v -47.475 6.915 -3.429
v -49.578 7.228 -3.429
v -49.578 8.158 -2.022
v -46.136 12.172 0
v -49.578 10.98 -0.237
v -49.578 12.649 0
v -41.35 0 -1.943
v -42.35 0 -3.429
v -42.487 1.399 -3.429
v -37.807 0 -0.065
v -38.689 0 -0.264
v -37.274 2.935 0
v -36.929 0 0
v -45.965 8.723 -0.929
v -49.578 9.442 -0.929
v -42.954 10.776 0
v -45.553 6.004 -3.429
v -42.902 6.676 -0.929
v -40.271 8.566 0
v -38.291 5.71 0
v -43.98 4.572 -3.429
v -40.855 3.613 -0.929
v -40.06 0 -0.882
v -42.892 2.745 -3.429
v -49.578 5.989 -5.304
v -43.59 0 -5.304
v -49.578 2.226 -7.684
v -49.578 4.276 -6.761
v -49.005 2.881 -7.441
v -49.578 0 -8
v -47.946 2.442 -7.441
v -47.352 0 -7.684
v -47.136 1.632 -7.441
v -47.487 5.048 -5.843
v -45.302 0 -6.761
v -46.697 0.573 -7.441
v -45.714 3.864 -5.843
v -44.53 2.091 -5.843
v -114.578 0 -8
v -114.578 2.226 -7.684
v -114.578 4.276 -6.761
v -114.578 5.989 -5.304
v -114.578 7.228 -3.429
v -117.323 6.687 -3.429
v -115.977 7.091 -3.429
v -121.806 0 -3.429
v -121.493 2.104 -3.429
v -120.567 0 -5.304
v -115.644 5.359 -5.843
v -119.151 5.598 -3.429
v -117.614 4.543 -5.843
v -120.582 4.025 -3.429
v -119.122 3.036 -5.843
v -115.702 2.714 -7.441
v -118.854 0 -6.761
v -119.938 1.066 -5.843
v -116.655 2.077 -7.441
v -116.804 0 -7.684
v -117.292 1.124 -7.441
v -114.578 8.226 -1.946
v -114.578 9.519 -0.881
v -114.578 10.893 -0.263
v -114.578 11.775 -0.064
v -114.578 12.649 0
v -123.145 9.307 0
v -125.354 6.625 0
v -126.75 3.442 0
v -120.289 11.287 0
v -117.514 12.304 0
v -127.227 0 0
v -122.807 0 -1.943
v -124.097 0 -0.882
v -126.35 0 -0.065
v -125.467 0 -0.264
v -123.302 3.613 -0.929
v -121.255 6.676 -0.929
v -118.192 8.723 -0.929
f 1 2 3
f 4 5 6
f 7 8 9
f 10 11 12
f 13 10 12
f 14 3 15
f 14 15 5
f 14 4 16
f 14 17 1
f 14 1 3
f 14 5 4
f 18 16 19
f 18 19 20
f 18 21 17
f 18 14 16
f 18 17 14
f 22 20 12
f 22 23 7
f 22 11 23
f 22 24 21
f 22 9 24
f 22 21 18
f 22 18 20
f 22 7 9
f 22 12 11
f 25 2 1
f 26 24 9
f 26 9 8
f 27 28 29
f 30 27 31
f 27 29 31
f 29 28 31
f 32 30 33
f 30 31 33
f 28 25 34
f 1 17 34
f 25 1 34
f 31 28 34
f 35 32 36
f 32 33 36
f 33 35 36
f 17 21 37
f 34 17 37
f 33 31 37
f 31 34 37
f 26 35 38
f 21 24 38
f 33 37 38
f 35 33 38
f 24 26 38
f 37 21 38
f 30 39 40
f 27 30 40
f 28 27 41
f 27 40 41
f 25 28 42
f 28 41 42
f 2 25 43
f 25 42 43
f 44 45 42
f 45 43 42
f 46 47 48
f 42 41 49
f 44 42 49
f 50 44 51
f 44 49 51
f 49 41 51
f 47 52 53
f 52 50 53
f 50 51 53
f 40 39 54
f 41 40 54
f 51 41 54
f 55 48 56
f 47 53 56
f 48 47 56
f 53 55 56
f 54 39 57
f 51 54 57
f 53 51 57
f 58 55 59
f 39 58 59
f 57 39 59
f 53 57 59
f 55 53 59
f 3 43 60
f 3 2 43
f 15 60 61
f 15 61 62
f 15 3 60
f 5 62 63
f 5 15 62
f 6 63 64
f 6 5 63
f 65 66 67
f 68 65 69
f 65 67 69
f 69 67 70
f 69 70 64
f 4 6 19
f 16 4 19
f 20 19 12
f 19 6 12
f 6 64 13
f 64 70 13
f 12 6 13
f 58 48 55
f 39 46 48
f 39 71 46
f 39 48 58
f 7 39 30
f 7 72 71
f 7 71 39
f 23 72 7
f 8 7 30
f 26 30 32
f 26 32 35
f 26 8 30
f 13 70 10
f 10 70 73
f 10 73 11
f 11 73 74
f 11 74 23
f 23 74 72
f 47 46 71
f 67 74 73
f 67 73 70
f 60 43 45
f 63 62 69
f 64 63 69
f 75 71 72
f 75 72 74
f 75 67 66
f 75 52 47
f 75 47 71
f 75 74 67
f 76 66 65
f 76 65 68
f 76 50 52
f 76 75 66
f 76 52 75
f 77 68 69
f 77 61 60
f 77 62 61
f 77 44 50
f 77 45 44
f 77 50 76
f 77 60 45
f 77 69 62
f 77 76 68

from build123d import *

# Parameters (mm, degrees)
SKETCH1_W           = 150
SKETCH1_H           = 150
BOSS_EXTRUDE1_DEPTH = 10
BOSS_EXTRUDE2_START = -30
BOSS_EXTRUDE2_DEPTH = 65
REVOLVE2_ANGLE      = 90
REVOLVE3_ANGLE      = 90
FILLET1_R           = 6
SKETCH12_W          = 150
SKETCH12_H          = 10
CUT_EXTRUDE1_DEPTH  = 209.573461212


with BuildPart() as part:
    # Sketch1 → Boss-Extrude1 (new body)
    with BuildSketch(Plane.XY):
        with Locations((-69.578313253, -0.451807229)):
            Rectangle(SKETCH1_W, SKETCH1_H)
    extrude(amount=BOSS_EXTRUDE1_DEPTH)

    # Sketch3 → Boss-Extrude2 (add)
    with BuildSketch(Plane.ZY.offset(144.578313253).offset(BOSS_EXTRUDE2_START)):
        with BuildLine():
            Line((0, 8), (0, 0))
            Line((0, 0), (-8, 0))
            ThreePointArc((-8, 0), (-5.656854249, 5.656854249), (0, 8))
        make_face()
    extrude(amount=-BOSS_EXTRUDE2_DEPTH)

    # Sketch10 → Revolve2 (revolve)
    with BuildSketch(Plane.ZY.offset(114.578313253)):
        with BuildLine():
            Line((-8, 0), (0, 0))
            Line((0, 0), (0, 8))
            ThreePointArc((0, 8), (-5.656854249, 5.656854249), (-8, 0))
        make_face()
    revolve(axis=Axis((-114.578313253, 0, -8), (0, 0, 1)), revolution_arc=REVOLVE2_ANGLE)

    # Sketch11 → Revolve3 (revolve)
    with BuildSketch(Plane(origin=(-49.578313253, 0, 0), x_dir=(0, 0, -1), z_dir=(1, 0, 0))):
        with BuildLine():
            Line((0, 8), (0, 0))
            Line((0, 0), (8, 0))
            ThreePointArc((8, 0), (5.656854249, 5.656854249), (0, 8))
        make_face()
    revolve(axis=Axis((-49.578313253, 0, 0), (0, 0, -1)), revolution_arc=REVOLVE3_ANGLE)

    # Fillet1
    fillet1_edges = [part.edges().sort_by_distance(p)[0] for p in [
        (-82.078313253, 8, 0),
        (-120.235167503, 5.656854249, 0),
        (-43.921459004, 5.656854249, 0),
    ]]
    fillet(fillet1_edges, radius=FILLET1_R)

    # Sketch12 → Cut-Extrude1 (cut, through all)
    with BuildSketch(Plane.XZ.offset(75.451807229)):
        with Locations((-69.578313253, 5)):
            Rectangle(SKETCH12_W, SKETCH12_H)
    extrude(amount=-CUT_EXTRUDE1_DEPTH, mode=Mode.SUBTRACT)


solid = part.part
